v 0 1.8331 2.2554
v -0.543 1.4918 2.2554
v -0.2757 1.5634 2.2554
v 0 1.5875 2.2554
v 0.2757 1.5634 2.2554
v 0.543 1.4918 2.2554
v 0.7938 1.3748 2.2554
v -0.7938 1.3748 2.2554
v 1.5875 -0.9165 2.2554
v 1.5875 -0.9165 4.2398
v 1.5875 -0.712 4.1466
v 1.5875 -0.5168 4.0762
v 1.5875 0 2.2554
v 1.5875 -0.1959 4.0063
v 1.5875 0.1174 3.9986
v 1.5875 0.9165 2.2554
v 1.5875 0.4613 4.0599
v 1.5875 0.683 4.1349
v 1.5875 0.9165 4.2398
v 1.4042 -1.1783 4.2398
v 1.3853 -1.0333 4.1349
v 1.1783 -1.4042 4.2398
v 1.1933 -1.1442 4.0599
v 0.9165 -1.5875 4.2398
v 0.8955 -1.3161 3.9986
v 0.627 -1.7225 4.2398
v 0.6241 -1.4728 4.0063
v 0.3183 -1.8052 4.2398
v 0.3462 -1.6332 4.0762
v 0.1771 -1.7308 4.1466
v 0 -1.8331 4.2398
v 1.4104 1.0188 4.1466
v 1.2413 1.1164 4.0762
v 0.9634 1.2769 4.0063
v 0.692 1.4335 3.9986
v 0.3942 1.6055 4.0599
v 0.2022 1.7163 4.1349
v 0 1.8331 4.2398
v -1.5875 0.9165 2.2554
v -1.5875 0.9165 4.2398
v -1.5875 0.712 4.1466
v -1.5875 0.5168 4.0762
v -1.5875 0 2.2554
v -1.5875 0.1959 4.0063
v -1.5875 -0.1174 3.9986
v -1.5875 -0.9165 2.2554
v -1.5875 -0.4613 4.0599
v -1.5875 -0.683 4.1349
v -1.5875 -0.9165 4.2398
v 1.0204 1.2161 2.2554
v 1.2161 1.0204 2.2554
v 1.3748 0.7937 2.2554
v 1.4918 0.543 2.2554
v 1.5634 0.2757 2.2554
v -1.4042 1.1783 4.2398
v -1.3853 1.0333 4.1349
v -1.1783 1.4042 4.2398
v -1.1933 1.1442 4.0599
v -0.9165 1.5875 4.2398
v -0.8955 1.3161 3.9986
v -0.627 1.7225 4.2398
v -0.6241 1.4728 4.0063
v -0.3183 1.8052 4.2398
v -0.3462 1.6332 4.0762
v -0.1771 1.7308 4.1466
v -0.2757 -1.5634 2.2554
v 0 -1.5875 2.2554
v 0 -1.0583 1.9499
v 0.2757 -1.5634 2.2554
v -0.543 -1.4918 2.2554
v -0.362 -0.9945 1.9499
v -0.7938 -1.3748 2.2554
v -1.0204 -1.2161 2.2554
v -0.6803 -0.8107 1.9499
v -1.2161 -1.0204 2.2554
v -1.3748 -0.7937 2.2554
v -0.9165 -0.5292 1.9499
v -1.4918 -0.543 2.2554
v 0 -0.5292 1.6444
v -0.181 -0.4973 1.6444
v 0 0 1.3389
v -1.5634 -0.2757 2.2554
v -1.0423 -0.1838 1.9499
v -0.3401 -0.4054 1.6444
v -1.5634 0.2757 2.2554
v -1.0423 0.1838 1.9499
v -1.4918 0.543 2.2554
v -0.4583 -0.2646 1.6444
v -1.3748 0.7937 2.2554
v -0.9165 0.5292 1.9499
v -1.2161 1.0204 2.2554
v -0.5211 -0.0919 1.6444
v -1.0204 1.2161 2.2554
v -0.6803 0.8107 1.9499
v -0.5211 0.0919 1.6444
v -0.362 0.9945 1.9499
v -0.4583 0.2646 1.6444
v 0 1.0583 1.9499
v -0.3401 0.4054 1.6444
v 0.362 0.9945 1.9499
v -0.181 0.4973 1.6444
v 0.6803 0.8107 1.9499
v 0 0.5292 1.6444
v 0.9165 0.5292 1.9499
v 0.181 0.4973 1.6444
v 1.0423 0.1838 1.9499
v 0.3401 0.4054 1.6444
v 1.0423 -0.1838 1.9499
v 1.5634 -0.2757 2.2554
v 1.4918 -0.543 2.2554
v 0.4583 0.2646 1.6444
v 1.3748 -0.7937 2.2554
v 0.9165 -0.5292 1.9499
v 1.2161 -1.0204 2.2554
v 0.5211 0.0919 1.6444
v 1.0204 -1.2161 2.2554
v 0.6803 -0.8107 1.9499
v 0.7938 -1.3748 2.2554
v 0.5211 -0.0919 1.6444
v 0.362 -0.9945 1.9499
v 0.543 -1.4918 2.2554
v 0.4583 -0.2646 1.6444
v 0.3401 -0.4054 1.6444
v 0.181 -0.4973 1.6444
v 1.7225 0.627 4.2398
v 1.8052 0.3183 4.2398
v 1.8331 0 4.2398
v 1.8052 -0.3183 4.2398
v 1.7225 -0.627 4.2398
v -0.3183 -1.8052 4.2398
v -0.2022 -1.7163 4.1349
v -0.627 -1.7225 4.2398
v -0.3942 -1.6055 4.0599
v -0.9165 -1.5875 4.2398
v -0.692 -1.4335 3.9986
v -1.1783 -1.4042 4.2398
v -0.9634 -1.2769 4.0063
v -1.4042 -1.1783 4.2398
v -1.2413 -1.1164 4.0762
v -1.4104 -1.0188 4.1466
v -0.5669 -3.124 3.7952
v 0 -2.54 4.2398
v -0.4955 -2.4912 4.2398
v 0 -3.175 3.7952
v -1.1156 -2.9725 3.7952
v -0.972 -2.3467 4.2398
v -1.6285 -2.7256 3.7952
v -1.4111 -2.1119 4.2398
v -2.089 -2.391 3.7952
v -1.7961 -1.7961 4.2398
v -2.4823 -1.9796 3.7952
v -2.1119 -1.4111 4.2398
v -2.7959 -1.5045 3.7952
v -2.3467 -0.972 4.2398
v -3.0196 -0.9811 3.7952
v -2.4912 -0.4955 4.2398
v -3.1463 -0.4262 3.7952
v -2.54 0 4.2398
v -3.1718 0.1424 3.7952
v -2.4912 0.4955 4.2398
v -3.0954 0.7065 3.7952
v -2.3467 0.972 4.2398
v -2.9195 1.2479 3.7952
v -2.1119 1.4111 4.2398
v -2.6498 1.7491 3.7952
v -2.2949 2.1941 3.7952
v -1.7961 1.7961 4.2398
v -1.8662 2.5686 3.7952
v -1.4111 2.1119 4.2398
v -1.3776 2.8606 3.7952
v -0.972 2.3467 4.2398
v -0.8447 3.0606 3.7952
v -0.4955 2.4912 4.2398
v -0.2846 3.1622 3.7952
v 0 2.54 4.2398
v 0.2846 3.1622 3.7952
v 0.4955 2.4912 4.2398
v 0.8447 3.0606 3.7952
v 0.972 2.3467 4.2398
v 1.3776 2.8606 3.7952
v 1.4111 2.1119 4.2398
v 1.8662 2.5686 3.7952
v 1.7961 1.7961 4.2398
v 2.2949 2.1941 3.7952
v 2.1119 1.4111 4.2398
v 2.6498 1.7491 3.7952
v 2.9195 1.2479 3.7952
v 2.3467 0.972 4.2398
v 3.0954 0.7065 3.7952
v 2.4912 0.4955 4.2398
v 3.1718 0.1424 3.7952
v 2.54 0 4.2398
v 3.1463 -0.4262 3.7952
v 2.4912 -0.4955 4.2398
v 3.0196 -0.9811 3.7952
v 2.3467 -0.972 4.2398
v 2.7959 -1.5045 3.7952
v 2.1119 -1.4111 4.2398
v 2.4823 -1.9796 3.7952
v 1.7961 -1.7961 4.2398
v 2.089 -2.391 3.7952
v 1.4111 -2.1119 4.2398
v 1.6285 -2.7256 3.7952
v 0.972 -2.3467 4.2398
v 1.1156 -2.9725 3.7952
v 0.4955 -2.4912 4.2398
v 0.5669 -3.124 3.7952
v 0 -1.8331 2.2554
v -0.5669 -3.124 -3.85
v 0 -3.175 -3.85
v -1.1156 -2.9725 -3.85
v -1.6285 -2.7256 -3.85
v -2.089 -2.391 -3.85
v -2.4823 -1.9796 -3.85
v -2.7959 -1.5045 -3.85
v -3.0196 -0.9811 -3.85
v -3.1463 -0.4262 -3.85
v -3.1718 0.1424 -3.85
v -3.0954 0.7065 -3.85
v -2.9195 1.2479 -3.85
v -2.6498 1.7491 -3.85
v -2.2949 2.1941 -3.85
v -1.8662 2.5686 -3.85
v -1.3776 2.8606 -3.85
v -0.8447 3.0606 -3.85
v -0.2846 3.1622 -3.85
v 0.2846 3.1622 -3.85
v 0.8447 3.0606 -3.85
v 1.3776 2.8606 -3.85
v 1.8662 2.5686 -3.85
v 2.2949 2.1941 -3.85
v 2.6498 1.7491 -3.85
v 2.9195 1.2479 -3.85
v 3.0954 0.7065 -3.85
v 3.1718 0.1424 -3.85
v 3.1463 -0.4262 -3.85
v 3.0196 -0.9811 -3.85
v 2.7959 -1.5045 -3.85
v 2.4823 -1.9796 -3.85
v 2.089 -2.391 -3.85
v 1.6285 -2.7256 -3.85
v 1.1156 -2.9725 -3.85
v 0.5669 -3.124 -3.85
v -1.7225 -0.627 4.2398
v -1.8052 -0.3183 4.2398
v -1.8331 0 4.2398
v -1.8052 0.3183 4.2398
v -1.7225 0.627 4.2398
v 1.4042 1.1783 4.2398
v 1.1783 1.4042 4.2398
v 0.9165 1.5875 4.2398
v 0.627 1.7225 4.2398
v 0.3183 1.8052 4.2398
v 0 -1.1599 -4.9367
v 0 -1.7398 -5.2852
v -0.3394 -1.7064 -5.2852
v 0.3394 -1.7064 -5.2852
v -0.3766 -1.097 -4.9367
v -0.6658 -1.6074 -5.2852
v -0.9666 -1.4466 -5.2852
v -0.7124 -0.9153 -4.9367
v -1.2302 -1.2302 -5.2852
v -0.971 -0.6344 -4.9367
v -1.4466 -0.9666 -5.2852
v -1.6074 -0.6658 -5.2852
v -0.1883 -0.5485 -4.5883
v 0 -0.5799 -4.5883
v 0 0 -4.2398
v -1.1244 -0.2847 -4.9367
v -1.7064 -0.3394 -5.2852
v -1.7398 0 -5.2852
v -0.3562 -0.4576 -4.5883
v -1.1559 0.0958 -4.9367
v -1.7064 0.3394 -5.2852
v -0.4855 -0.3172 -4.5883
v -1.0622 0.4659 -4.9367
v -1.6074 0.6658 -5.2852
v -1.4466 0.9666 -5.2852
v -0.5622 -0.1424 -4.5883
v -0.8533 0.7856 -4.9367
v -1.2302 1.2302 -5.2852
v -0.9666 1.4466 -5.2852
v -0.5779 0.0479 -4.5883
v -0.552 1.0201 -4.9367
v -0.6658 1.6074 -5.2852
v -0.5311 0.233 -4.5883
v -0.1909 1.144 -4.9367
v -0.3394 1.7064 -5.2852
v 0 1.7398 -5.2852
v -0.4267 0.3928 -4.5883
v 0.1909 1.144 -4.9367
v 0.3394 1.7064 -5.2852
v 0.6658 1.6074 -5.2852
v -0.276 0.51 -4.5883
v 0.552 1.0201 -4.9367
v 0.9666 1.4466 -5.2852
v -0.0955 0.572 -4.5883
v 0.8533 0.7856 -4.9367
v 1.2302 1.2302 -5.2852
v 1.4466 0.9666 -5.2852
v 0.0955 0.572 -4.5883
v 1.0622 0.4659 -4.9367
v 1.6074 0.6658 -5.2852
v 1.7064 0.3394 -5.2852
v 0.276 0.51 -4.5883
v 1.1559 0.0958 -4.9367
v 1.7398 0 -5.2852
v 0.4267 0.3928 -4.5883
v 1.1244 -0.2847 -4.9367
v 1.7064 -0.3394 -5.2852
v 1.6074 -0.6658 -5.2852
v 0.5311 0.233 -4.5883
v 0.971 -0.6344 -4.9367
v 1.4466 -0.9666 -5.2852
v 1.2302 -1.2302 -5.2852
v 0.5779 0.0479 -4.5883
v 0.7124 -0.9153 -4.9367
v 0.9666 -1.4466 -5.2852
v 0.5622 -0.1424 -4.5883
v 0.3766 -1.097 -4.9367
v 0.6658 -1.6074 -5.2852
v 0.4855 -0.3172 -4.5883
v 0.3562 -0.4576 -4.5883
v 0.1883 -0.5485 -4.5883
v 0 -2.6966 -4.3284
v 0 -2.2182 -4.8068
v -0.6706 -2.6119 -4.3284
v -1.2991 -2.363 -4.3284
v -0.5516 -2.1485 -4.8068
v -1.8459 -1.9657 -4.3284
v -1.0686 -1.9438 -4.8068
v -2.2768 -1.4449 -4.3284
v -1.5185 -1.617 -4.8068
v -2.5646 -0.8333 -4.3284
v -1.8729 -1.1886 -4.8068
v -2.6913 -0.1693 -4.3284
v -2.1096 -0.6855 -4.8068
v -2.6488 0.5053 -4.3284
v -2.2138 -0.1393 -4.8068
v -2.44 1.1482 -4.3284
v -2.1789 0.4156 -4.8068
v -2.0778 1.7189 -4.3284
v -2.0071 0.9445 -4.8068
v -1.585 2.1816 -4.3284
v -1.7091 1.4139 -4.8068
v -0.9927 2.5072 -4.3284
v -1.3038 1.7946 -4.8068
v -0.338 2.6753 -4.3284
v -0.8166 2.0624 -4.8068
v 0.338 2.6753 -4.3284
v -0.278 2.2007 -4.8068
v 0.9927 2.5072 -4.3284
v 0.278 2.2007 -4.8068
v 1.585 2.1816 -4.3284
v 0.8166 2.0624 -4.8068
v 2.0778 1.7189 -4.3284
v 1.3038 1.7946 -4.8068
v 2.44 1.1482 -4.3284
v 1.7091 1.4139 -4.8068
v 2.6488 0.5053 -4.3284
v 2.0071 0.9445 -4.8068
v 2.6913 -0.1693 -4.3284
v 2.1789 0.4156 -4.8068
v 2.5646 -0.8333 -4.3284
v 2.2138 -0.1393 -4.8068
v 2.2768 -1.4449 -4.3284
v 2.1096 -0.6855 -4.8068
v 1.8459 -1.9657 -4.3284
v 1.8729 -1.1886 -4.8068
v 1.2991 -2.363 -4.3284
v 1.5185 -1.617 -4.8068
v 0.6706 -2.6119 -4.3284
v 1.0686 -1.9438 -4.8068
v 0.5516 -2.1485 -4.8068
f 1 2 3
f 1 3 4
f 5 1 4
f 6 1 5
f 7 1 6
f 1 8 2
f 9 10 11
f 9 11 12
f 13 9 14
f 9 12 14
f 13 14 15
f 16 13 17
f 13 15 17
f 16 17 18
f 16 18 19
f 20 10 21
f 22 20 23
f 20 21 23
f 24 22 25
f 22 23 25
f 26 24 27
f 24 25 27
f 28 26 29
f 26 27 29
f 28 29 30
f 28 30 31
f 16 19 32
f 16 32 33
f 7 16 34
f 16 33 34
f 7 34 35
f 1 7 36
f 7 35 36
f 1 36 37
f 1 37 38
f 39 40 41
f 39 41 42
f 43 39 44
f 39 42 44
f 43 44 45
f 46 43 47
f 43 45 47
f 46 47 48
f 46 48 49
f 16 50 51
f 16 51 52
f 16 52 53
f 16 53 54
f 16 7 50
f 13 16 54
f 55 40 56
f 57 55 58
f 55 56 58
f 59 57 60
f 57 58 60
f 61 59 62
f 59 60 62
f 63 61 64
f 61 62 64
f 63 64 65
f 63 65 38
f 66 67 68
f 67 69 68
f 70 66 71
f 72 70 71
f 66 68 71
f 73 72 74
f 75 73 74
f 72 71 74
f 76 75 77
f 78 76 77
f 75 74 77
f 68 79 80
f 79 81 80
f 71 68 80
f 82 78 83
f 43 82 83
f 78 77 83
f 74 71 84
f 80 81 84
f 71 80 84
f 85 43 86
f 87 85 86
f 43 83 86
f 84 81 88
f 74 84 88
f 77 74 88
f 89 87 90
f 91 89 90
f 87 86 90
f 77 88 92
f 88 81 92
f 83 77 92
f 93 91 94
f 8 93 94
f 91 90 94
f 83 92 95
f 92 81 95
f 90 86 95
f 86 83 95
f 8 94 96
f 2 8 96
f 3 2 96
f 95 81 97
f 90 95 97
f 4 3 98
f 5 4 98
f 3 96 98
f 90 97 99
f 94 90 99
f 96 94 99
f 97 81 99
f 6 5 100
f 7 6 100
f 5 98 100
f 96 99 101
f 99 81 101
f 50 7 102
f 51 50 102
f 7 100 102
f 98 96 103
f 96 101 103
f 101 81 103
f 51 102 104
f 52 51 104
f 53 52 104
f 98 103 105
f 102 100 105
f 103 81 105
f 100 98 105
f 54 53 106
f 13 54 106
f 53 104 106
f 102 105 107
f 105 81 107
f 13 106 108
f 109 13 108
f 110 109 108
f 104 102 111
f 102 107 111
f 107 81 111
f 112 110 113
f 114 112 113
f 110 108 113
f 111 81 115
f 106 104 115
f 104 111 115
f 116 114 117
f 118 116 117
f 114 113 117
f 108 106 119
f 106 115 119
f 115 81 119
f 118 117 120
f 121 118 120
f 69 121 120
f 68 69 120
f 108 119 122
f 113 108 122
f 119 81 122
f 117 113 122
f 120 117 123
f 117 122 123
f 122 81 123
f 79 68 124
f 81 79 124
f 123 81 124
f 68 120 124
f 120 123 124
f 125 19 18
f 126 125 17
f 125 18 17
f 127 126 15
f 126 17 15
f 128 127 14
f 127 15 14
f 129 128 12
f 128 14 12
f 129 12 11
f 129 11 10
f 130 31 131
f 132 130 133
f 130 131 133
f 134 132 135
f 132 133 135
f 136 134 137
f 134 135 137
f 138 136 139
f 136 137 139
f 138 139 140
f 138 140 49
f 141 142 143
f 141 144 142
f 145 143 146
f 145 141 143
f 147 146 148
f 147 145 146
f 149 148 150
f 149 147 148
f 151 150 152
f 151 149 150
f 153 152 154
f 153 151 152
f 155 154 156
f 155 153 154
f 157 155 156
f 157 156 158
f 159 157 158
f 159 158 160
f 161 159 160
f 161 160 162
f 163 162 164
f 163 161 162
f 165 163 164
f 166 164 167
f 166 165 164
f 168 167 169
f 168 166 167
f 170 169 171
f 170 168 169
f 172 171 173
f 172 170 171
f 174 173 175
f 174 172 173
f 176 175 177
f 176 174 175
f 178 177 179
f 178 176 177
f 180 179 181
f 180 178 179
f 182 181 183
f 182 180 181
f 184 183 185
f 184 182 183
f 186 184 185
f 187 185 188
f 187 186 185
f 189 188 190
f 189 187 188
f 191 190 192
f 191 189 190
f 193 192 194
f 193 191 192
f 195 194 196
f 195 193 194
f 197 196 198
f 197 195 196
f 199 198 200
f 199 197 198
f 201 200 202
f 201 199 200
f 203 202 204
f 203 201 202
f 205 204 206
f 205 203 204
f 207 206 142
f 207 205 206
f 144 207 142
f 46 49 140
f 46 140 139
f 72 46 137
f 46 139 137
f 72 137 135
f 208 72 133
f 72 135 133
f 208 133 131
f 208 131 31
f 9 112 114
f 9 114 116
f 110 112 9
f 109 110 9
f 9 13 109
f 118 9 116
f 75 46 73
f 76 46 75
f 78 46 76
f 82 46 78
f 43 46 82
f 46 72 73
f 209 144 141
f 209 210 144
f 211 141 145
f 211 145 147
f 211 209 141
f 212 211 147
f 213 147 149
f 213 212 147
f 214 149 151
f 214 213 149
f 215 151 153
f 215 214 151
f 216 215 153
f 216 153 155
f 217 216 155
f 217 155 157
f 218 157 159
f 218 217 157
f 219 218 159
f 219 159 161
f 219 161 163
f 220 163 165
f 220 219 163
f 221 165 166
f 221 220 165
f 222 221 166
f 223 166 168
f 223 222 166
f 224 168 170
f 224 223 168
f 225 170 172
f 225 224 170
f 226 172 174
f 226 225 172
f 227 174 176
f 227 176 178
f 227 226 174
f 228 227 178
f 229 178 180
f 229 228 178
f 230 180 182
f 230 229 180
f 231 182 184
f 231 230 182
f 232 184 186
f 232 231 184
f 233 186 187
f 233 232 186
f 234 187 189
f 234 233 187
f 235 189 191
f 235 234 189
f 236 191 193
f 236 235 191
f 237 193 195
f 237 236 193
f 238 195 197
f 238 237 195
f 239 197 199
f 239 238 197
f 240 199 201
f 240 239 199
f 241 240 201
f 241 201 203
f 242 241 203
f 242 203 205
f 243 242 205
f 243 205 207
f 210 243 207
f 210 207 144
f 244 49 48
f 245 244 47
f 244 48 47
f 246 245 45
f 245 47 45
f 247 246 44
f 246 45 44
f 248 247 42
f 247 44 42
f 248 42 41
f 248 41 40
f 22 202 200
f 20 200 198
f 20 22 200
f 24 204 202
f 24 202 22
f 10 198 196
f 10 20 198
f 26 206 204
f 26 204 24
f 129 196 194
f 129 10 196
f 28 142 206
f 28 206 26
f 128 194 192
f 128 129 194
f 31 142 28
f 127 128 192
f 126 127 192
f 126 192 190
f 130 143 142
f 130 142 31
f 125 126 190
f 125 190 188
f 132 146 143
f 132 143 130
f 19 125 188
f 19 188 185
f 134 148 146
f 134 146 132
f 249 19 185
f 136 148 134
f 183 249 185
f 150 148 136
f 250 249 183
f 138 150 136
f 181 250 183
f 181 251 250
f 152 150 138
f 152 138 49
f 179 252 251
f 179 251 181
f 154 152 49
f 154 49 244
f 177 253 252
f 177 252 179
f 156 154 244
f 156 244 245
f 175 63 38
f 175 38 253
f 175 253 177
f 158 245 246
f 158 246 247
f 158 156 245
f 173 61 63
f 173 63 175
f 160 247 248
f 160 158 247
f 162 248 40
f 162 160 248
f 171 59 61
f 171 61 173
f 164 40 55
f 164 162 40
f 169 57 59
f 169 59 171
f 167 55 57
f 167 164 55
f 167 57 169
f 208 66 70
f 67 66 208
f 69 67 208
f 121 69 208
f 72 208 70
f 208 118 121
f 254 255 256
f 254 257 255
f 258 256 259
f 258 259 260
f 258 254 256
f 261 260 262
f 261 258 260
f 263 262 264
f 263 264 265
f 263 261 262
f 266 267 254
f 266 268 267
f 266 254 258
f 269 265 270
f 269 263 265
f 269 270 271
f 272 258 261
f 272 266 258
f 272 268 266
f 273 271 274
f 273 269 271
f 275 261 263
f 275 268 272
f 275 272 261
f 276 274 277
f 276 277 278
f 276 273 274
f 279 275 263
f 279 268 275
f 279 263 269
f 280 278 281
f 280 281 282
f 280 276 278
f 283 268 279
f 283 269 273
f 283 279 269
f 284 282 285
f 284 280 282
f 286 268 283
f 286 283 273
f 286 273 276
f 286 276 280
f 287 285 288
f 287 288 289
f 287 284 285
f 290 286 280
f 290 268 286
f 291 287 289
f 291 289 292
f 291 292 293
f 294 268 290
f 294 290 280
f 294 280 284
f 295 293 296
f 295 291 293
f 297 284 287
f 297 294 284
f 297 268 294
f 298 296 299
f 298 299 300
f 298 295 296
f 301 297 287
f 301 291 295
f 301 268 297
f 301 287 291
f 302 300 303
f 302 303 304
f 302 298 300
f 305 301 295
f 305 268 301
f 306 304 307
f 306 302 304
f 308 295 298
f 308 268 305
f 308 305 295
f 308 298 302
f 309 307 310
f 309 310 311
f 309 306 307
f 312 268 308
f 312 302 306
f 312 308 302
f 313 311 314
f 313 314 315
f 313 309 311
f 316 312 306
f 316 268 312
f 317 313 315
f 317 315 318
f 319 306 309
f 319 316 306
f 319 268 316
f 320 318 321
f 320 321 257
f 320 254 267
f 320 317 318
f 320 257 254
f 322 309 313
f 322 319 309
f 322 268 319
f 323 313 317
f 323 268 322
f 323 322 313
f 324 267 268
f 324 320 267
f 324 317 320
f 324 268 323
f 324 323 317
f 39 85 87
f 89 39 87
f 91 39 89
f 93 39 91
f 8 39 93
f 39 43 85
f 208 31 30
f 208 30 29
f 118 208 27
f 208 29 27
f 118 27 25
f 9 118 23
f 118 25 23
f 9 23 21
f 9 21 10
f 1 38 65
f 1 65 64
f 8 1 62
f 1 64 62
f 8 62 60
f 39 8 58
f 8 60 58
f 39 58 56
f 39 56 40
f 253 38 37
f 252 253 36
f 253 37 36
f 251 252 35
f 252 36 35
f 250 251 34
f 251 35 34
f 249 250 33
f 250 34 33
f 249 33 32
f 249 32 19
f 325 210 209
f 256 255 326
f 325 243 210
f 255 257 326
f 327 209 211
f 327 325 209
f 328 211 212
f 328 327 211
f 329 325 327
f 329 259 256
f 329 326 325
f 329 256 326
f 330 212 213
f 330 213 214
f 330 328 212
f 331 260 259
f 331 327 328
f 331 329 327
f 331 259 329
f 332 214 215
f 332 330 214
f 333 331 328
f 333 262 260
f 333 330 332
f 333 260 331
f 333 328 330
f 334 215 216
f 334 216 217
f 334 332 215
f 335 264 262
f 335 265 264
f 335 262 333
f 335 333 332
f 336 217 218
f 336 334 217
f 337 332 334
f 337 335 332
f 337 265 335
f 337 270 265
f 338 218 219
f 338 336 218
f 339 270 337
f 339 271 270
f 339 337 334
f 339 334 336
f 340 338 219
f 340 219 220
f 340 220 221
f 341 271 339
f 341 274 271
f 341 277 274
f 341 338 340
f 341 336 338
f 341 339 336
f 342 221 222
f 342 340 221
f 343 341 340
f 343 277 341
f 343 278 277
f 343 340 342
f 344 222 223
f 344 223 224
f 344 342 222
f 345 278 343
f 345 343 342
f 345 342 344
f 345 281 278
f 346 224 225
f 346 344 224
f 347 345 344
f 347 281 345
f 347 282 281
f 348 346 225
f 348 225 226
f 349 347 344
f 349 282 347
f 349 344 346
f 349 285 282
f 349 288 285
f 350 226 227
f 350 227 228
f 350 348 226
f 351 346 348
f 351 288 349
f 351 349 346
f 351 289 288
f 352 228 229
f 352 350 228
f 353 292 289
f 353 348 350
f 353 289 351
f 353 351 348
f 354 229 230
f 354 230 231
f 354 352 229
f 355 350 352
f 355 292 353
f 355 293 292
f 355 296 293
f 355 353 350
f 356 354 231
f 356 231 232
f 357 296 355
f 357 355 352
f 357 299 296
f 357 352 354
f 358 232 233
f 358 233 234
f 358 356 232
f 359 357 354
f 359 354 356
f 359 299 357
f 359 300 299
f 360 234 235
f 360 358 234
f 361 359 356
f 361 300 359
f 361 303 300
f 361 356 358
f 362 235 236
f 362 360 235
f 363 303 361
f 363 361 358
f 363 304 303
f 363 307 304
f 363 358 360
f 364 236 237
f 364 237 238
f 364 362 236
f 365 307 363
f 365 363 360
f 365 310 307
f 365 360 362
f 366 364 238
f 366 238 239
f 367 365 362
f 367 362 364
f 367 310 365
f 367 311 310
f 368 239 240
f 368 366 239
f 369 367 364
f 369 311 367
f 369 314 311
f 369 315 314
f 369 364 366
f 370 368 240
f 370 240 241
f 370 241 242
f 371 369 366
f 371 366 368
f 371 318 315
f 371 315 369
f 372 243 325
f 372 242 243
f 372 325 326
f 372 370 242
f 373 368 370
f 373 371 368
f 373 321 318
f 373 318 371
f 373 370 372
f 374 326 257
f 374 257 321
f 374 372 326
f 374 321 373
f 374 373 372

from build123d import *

# Parameters (mm, degrees)
CUT_EXTRUDE10_DEPTH = 1.984375


with BuildPart() as part:
    # Sketch22 → Revolve1 (revolve)
    with BuildSketch(Plane(origin=(0, 0, 0), x_dir=(0, 0, -1), z_dir=(1, 0, 0))):
        Polygon((-4.239814779, 0), (-4.239814779, 2.54), (-3.795182992, 3.175), (3.849973798, 3.175), (5.285185221, 1.739788577), (4.239814779, 0), align=None)
    revolve(axis=Axis((0, 0, -4.239814779), (0, 0, -1)))

    # Sketch23 → Cut-Extrude10 (cut)
    with BuildSketch(Plane.XY.offset(4.239814779)):
        Polygon((0, 1.833087105), (-1.5875, 0.916543552), (-1.5875, -0.916543552), (0, -1.833087105), (1.5875, -0.916543552), (1.5875, 0.916543552), align=None)
    extrude(amount=-CUT_EXTRUDE10_DEPTH, mode=Mode.SUBTRACT)

    # Cut-Extrude11 cone 1 section (through the dimple's axis) → Cut-Extrude11 (revolve, cut)
    with BuildSketch(Plane(origin=(0, 0, 4.239814779), x_dir=(0, -1, 0), z_dir=(1, 0, 0))):
        Polygon((0, 0), (1.833087105, 0), (0, 1.833087105), align=None)
    revolve(axis=Axis((0, 0, 4.239814779), (0, 0, -1)), mode=Mode.SUBTRACT)

    # Cut-Extrude12 cone 1 section (through the dimple's axis) → Cut-Extrude12 (revolve, cut)
    with BuildSketch(Plane(origin=(0, 0, 2.255439779), x_dir=(0, -1, 0), z_dir=(1, 0, 0))):
        Polygon((0, 0), (1.5875, 0), (0, 0.916543552), align=None)
    revolve(axis=Axis((0, 0, 2.255439779), (0, 0, -1)), mode=Mode.SUBTRACT)


solid = part.part
